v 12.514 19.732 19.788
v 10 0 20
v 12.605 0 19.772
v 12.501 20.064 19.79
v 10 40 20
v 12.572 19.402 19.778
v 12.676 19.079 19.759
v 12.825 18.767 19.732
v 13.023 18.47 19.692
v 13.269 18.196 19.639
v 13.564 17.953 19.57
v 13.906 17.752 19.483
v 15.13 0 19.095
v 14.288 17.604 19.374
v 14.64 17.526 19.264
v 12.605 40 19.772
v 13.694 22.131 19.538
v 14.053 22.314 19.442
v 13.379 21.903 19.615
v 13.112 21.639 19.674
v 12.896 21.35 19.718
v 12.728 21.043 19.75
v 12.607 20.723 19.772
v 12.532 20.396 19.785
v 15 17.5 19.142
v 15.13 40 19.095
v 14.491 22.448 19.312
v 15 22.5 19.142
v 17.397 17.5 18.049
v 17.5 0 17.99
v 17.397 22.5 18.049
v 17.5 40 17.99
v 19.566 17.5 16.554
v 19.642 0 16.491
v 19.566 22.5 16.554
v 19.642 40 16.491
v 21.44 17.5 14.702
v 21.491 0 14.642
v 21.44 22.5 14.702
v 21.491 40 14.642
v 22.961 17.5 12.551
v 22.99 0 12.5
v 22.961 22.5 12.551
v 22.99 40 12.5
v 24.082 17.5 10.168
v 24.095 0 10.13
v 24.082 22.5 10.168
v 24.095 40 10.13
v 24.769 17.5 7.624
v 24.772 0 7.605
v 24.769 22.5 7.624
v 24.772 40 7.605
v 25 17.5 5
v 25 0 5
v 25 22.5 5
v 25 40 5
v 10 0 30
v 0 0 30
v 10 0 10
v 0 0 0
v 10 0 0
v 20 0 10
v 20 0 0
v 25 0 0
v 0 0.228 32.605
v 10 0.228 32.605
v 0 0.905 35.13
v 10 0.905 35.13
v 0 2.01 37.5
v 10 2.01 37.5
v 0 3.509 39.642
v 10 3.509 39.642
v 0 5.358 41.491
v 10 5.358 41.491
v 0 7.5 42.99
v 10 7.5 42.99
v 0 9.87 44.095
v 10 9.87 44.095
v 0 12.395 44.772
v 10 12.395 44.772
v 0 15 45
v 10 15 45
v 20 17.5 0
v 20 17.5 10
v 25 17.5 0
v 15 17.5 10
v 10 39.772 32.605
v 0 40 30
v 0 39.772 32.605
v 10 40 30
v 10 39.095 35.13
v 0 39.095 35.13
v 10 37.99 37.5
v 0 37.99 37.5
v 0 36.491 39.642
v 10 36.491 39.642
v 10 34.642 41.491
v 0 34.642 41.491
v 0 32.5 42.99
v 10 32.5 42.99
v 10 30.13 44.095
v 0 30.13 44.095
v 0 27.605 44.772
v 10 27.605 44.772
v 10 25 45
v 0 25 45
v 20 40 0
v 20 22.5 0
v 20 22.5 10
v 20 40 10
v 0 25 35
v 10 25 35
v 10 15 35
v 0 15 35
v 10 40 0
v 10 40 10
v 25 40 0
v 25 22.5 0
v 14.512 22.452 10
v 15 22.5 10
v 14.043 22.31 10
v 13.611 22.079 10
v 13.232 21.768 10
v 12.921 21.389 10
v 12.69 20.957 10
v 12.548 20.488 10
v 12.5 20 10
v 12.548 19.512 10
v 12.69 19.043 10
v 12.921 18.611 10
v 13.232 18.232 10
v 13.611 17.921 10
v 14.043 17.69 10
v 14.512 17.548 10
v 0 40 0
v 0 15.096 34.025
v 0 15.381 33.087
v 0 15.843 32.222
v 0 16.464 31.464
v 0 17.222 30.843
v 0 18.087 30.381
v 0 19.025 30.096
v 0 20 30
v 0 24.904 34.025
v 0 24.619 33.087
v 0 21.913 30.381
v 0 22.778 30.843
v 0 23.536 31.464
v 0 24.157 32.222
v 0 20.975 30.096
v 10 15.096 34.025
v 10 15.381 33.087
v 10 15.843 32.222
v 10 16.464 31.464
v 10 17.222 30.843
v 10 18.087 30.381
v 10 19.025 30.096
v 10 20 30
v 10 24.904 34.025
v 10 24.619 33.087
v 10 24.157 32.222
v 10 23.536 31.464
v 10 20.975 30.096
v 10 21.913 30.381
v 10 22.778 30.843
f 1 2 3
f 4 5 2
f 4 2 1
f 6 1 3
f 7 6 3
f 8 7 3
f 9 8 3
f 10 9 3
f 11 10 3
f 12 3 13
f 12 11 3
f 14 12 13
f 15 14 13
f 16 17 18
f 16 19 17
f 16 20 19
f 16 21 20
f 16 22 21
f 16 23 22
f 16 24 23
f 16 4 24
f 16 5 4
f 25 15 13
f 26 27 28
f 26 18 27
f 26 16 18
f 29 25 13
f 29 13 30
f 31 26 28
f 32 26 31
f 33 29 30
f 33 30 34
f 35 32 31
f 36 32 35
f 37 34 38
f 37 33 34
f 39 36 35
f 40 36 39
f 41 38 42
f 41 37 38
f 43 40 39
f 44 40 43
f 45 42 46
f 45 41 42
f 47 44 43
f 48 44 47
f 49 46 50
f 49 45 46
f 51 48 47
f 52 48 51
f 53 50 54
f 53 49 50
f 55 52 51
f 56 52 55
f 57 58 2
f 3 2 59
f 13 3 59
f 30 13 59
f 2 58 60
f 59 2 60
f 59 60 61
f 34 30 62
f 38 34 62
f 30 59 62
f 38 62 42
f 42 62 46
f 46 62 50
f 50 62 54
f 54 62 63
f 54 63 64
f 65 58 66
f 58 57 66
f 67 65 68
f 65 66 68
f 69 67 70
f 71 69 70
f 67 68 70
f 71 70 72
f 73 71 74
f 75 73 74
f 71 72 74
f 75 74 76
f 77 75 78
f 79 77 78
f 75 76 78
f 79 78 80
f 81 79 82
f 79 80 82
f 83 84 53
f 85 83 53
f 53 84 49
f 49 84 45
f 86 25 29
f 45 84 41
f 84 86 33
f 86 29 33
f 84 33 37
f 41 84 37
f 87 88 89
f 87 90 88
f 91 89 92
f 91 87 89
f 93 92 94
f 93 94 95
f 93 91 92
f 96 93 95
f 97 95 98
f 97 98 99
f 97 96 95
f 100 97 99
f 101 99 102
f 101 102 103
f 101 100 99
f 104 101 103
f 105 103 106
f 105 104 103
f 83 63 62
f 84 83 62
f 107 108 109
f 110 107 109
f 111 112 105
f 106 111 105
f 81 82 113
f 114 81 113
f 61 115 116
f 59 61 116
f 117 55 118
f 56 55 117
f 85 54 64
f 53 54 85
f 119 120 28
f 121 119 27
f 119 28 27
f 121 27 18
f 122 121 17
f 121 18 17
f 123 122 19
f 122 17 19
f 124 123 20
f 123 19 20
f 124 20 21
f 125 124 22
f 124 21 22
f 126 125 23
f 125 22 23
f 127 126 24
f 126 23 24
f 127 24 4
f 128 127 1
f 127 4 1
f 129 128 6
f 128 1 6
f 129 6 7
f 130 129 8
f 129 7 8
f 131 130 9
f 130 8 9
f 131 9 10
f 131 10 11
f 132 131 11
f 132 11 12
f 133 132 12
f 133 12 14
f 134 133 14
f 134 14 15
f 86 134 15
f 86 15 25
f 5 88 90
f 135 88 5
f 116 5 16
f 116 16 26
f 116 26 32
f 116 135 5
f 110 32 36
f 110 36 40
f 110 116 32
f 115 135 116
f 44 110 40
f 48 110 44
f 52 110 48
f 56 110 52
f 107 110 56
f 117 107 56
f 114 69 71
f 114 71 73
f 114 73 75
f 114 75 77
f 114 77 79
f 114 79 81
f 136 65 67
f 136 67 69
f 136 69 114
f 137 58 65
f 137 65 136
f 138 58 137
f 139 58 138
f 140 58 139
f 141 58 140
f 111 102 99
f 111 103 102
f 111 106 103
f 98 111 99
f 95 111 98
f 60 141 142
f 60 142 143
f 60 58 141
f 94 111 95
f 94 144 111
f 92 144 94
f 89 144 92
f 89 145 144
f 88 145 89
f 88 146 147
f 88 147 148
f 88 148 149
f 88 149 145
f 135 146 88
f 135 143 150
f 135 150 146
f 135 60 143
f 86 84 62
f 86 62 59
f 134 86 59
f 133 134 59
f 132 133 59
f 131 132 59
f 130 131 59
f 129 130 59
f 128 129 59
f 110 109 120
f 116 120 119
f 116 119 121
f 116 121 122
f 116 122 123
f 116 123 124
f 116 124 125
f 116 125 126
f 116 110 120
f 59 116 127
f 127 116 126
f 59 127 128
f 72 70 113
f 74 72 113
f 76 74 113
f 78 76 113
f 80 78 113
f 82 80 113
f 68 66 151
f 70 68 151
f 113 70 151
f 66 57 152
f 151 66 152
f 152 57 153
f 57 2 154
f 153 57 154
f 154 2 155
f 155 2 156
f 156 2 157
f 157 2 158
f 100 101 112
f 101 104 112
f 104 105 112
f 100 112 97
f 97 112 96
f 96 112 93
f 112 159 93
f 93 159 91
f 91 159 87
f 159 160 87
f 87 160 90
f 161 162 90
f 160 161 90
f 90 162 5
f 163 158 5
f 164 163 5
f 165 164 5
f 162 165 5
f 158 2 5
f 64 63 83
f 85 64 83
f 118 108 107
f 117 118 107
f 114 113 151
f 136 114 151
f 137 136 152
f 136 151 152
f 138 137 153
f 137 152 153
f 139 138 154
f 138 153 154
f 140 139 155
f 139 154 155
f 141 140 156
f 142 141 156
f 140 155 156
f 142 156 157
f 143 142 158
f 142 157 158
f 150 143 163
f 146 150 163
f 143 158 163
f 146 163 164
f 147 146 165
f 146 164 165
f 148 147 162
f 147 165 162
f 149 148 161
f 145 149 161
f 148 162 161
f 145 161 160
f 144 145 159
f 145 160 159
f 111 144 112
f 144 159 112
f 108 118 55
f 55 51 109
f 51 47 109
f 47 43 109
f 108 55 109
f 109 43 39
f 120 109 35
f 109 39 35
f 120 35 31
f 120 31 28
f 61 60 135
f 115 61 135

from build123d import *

# Parameters (mm, degrees)
F0_W      = 40
F0_H      = 20
F1_DEPTH  = 25
F2_W      = 10
F2_H      = 40
F3_DEPTH  = 25
F4_W      = 10
F4_H      = 2.6823076606
F5_DEPTH  = 50
F7_DEPTH  = 50
F8_R      = 14.99999
F9_F1_R   = 14.9999
F10_W     = 10
F10_H     = 10
F11_DEPTH = 100


# Not quite as in the source:
# - a fillet or chamfer is up to 0.001 mm smaller than in the source, because OpenCascade refuses the exact size


with BuildPart() as f1:
    # F0 (on Right) → F1 (new body)
    with BuildSketch(Plane.YZ):
        with Locations((20, 10)):
            Rectangle(F0_W, F0_H)
    extrude(amount=F1_DEPTH)

    # F2 (on face) → F3 (join)
    with BuildSketch(Plane.XY.offset(20)):
        with Locations((5, 20)):
            Rectangle(F2_W, F2_H)
    extrude(amount=F3_DEPTH)

    # F4 (on face) → F5 (cut)
    with BuildSketch(Plane.YZ.offset(10)):
        with BuildLine():
            Line((15, 45), (15, 35))
            ThreePointArc((15, 35), (20, 30), (25, 35))
            Line((25, 35), (25, 45))
            Line((25, 45), (15, 45))
        make_face()
        with Locations((20, 46.3411538303)):
            Rectangle(F4_W, F4_H)
    extrude(amount=-F5_DEPTH, mode=Mode.SUBTRACT)

    # F6 (on face) → F7 (cut)
    with BuildSketch(Plane.XY.offset(20)):
        with BuildLine():
            Line((25, 22.5), (15, 22.5))
            ThreePointArc((15, 22.5), (12.5, 20), (15, 17.5))
            Line((15, 17.5), (25, 17.5))
            Line((25, 17.5), (25, 22.5))
        make_face()
    extrude(amount=-F7_DEPTH, mode=Mode.SUBTRACT)

    # F8 (radius 15 in the source; OpenCascade refuses exactly that, so slightly less here)
    f8_edges = [f1.edges().sort_by_distance(p)[0] for p in [
        (5, 40, 45),
        (5, 0, 45),
    ]]
    fillet(f8_edges, radius=F8_R)

    # F9: fillet of radius 15 on 2 edges, made by hand

    # F9_f1 (radius 15 in the source; OpenCascade refuses exactly that, so slightly less here)
    f9_f1_edges = [f1.edges().sort_by_distance(p)[0] for p in [
        (25, 8.75, 20),
    ]]
    fillet(f9_f1_edges, radius=F9_F1_R)

    # F10 (on face) → F11 (cut)
    with BuildSketch(Plane(origin=(0, 40, 0), x_dir=(-1, 0, 0), z_dir=(0, 1, 0))):
        with Locations((-15, 5)):
            Rectangle(F10_W, F10_H)
    extrude(amount=-F11_DEPTH, mode=Mode.SUBTRACT)


solid = f1.part
